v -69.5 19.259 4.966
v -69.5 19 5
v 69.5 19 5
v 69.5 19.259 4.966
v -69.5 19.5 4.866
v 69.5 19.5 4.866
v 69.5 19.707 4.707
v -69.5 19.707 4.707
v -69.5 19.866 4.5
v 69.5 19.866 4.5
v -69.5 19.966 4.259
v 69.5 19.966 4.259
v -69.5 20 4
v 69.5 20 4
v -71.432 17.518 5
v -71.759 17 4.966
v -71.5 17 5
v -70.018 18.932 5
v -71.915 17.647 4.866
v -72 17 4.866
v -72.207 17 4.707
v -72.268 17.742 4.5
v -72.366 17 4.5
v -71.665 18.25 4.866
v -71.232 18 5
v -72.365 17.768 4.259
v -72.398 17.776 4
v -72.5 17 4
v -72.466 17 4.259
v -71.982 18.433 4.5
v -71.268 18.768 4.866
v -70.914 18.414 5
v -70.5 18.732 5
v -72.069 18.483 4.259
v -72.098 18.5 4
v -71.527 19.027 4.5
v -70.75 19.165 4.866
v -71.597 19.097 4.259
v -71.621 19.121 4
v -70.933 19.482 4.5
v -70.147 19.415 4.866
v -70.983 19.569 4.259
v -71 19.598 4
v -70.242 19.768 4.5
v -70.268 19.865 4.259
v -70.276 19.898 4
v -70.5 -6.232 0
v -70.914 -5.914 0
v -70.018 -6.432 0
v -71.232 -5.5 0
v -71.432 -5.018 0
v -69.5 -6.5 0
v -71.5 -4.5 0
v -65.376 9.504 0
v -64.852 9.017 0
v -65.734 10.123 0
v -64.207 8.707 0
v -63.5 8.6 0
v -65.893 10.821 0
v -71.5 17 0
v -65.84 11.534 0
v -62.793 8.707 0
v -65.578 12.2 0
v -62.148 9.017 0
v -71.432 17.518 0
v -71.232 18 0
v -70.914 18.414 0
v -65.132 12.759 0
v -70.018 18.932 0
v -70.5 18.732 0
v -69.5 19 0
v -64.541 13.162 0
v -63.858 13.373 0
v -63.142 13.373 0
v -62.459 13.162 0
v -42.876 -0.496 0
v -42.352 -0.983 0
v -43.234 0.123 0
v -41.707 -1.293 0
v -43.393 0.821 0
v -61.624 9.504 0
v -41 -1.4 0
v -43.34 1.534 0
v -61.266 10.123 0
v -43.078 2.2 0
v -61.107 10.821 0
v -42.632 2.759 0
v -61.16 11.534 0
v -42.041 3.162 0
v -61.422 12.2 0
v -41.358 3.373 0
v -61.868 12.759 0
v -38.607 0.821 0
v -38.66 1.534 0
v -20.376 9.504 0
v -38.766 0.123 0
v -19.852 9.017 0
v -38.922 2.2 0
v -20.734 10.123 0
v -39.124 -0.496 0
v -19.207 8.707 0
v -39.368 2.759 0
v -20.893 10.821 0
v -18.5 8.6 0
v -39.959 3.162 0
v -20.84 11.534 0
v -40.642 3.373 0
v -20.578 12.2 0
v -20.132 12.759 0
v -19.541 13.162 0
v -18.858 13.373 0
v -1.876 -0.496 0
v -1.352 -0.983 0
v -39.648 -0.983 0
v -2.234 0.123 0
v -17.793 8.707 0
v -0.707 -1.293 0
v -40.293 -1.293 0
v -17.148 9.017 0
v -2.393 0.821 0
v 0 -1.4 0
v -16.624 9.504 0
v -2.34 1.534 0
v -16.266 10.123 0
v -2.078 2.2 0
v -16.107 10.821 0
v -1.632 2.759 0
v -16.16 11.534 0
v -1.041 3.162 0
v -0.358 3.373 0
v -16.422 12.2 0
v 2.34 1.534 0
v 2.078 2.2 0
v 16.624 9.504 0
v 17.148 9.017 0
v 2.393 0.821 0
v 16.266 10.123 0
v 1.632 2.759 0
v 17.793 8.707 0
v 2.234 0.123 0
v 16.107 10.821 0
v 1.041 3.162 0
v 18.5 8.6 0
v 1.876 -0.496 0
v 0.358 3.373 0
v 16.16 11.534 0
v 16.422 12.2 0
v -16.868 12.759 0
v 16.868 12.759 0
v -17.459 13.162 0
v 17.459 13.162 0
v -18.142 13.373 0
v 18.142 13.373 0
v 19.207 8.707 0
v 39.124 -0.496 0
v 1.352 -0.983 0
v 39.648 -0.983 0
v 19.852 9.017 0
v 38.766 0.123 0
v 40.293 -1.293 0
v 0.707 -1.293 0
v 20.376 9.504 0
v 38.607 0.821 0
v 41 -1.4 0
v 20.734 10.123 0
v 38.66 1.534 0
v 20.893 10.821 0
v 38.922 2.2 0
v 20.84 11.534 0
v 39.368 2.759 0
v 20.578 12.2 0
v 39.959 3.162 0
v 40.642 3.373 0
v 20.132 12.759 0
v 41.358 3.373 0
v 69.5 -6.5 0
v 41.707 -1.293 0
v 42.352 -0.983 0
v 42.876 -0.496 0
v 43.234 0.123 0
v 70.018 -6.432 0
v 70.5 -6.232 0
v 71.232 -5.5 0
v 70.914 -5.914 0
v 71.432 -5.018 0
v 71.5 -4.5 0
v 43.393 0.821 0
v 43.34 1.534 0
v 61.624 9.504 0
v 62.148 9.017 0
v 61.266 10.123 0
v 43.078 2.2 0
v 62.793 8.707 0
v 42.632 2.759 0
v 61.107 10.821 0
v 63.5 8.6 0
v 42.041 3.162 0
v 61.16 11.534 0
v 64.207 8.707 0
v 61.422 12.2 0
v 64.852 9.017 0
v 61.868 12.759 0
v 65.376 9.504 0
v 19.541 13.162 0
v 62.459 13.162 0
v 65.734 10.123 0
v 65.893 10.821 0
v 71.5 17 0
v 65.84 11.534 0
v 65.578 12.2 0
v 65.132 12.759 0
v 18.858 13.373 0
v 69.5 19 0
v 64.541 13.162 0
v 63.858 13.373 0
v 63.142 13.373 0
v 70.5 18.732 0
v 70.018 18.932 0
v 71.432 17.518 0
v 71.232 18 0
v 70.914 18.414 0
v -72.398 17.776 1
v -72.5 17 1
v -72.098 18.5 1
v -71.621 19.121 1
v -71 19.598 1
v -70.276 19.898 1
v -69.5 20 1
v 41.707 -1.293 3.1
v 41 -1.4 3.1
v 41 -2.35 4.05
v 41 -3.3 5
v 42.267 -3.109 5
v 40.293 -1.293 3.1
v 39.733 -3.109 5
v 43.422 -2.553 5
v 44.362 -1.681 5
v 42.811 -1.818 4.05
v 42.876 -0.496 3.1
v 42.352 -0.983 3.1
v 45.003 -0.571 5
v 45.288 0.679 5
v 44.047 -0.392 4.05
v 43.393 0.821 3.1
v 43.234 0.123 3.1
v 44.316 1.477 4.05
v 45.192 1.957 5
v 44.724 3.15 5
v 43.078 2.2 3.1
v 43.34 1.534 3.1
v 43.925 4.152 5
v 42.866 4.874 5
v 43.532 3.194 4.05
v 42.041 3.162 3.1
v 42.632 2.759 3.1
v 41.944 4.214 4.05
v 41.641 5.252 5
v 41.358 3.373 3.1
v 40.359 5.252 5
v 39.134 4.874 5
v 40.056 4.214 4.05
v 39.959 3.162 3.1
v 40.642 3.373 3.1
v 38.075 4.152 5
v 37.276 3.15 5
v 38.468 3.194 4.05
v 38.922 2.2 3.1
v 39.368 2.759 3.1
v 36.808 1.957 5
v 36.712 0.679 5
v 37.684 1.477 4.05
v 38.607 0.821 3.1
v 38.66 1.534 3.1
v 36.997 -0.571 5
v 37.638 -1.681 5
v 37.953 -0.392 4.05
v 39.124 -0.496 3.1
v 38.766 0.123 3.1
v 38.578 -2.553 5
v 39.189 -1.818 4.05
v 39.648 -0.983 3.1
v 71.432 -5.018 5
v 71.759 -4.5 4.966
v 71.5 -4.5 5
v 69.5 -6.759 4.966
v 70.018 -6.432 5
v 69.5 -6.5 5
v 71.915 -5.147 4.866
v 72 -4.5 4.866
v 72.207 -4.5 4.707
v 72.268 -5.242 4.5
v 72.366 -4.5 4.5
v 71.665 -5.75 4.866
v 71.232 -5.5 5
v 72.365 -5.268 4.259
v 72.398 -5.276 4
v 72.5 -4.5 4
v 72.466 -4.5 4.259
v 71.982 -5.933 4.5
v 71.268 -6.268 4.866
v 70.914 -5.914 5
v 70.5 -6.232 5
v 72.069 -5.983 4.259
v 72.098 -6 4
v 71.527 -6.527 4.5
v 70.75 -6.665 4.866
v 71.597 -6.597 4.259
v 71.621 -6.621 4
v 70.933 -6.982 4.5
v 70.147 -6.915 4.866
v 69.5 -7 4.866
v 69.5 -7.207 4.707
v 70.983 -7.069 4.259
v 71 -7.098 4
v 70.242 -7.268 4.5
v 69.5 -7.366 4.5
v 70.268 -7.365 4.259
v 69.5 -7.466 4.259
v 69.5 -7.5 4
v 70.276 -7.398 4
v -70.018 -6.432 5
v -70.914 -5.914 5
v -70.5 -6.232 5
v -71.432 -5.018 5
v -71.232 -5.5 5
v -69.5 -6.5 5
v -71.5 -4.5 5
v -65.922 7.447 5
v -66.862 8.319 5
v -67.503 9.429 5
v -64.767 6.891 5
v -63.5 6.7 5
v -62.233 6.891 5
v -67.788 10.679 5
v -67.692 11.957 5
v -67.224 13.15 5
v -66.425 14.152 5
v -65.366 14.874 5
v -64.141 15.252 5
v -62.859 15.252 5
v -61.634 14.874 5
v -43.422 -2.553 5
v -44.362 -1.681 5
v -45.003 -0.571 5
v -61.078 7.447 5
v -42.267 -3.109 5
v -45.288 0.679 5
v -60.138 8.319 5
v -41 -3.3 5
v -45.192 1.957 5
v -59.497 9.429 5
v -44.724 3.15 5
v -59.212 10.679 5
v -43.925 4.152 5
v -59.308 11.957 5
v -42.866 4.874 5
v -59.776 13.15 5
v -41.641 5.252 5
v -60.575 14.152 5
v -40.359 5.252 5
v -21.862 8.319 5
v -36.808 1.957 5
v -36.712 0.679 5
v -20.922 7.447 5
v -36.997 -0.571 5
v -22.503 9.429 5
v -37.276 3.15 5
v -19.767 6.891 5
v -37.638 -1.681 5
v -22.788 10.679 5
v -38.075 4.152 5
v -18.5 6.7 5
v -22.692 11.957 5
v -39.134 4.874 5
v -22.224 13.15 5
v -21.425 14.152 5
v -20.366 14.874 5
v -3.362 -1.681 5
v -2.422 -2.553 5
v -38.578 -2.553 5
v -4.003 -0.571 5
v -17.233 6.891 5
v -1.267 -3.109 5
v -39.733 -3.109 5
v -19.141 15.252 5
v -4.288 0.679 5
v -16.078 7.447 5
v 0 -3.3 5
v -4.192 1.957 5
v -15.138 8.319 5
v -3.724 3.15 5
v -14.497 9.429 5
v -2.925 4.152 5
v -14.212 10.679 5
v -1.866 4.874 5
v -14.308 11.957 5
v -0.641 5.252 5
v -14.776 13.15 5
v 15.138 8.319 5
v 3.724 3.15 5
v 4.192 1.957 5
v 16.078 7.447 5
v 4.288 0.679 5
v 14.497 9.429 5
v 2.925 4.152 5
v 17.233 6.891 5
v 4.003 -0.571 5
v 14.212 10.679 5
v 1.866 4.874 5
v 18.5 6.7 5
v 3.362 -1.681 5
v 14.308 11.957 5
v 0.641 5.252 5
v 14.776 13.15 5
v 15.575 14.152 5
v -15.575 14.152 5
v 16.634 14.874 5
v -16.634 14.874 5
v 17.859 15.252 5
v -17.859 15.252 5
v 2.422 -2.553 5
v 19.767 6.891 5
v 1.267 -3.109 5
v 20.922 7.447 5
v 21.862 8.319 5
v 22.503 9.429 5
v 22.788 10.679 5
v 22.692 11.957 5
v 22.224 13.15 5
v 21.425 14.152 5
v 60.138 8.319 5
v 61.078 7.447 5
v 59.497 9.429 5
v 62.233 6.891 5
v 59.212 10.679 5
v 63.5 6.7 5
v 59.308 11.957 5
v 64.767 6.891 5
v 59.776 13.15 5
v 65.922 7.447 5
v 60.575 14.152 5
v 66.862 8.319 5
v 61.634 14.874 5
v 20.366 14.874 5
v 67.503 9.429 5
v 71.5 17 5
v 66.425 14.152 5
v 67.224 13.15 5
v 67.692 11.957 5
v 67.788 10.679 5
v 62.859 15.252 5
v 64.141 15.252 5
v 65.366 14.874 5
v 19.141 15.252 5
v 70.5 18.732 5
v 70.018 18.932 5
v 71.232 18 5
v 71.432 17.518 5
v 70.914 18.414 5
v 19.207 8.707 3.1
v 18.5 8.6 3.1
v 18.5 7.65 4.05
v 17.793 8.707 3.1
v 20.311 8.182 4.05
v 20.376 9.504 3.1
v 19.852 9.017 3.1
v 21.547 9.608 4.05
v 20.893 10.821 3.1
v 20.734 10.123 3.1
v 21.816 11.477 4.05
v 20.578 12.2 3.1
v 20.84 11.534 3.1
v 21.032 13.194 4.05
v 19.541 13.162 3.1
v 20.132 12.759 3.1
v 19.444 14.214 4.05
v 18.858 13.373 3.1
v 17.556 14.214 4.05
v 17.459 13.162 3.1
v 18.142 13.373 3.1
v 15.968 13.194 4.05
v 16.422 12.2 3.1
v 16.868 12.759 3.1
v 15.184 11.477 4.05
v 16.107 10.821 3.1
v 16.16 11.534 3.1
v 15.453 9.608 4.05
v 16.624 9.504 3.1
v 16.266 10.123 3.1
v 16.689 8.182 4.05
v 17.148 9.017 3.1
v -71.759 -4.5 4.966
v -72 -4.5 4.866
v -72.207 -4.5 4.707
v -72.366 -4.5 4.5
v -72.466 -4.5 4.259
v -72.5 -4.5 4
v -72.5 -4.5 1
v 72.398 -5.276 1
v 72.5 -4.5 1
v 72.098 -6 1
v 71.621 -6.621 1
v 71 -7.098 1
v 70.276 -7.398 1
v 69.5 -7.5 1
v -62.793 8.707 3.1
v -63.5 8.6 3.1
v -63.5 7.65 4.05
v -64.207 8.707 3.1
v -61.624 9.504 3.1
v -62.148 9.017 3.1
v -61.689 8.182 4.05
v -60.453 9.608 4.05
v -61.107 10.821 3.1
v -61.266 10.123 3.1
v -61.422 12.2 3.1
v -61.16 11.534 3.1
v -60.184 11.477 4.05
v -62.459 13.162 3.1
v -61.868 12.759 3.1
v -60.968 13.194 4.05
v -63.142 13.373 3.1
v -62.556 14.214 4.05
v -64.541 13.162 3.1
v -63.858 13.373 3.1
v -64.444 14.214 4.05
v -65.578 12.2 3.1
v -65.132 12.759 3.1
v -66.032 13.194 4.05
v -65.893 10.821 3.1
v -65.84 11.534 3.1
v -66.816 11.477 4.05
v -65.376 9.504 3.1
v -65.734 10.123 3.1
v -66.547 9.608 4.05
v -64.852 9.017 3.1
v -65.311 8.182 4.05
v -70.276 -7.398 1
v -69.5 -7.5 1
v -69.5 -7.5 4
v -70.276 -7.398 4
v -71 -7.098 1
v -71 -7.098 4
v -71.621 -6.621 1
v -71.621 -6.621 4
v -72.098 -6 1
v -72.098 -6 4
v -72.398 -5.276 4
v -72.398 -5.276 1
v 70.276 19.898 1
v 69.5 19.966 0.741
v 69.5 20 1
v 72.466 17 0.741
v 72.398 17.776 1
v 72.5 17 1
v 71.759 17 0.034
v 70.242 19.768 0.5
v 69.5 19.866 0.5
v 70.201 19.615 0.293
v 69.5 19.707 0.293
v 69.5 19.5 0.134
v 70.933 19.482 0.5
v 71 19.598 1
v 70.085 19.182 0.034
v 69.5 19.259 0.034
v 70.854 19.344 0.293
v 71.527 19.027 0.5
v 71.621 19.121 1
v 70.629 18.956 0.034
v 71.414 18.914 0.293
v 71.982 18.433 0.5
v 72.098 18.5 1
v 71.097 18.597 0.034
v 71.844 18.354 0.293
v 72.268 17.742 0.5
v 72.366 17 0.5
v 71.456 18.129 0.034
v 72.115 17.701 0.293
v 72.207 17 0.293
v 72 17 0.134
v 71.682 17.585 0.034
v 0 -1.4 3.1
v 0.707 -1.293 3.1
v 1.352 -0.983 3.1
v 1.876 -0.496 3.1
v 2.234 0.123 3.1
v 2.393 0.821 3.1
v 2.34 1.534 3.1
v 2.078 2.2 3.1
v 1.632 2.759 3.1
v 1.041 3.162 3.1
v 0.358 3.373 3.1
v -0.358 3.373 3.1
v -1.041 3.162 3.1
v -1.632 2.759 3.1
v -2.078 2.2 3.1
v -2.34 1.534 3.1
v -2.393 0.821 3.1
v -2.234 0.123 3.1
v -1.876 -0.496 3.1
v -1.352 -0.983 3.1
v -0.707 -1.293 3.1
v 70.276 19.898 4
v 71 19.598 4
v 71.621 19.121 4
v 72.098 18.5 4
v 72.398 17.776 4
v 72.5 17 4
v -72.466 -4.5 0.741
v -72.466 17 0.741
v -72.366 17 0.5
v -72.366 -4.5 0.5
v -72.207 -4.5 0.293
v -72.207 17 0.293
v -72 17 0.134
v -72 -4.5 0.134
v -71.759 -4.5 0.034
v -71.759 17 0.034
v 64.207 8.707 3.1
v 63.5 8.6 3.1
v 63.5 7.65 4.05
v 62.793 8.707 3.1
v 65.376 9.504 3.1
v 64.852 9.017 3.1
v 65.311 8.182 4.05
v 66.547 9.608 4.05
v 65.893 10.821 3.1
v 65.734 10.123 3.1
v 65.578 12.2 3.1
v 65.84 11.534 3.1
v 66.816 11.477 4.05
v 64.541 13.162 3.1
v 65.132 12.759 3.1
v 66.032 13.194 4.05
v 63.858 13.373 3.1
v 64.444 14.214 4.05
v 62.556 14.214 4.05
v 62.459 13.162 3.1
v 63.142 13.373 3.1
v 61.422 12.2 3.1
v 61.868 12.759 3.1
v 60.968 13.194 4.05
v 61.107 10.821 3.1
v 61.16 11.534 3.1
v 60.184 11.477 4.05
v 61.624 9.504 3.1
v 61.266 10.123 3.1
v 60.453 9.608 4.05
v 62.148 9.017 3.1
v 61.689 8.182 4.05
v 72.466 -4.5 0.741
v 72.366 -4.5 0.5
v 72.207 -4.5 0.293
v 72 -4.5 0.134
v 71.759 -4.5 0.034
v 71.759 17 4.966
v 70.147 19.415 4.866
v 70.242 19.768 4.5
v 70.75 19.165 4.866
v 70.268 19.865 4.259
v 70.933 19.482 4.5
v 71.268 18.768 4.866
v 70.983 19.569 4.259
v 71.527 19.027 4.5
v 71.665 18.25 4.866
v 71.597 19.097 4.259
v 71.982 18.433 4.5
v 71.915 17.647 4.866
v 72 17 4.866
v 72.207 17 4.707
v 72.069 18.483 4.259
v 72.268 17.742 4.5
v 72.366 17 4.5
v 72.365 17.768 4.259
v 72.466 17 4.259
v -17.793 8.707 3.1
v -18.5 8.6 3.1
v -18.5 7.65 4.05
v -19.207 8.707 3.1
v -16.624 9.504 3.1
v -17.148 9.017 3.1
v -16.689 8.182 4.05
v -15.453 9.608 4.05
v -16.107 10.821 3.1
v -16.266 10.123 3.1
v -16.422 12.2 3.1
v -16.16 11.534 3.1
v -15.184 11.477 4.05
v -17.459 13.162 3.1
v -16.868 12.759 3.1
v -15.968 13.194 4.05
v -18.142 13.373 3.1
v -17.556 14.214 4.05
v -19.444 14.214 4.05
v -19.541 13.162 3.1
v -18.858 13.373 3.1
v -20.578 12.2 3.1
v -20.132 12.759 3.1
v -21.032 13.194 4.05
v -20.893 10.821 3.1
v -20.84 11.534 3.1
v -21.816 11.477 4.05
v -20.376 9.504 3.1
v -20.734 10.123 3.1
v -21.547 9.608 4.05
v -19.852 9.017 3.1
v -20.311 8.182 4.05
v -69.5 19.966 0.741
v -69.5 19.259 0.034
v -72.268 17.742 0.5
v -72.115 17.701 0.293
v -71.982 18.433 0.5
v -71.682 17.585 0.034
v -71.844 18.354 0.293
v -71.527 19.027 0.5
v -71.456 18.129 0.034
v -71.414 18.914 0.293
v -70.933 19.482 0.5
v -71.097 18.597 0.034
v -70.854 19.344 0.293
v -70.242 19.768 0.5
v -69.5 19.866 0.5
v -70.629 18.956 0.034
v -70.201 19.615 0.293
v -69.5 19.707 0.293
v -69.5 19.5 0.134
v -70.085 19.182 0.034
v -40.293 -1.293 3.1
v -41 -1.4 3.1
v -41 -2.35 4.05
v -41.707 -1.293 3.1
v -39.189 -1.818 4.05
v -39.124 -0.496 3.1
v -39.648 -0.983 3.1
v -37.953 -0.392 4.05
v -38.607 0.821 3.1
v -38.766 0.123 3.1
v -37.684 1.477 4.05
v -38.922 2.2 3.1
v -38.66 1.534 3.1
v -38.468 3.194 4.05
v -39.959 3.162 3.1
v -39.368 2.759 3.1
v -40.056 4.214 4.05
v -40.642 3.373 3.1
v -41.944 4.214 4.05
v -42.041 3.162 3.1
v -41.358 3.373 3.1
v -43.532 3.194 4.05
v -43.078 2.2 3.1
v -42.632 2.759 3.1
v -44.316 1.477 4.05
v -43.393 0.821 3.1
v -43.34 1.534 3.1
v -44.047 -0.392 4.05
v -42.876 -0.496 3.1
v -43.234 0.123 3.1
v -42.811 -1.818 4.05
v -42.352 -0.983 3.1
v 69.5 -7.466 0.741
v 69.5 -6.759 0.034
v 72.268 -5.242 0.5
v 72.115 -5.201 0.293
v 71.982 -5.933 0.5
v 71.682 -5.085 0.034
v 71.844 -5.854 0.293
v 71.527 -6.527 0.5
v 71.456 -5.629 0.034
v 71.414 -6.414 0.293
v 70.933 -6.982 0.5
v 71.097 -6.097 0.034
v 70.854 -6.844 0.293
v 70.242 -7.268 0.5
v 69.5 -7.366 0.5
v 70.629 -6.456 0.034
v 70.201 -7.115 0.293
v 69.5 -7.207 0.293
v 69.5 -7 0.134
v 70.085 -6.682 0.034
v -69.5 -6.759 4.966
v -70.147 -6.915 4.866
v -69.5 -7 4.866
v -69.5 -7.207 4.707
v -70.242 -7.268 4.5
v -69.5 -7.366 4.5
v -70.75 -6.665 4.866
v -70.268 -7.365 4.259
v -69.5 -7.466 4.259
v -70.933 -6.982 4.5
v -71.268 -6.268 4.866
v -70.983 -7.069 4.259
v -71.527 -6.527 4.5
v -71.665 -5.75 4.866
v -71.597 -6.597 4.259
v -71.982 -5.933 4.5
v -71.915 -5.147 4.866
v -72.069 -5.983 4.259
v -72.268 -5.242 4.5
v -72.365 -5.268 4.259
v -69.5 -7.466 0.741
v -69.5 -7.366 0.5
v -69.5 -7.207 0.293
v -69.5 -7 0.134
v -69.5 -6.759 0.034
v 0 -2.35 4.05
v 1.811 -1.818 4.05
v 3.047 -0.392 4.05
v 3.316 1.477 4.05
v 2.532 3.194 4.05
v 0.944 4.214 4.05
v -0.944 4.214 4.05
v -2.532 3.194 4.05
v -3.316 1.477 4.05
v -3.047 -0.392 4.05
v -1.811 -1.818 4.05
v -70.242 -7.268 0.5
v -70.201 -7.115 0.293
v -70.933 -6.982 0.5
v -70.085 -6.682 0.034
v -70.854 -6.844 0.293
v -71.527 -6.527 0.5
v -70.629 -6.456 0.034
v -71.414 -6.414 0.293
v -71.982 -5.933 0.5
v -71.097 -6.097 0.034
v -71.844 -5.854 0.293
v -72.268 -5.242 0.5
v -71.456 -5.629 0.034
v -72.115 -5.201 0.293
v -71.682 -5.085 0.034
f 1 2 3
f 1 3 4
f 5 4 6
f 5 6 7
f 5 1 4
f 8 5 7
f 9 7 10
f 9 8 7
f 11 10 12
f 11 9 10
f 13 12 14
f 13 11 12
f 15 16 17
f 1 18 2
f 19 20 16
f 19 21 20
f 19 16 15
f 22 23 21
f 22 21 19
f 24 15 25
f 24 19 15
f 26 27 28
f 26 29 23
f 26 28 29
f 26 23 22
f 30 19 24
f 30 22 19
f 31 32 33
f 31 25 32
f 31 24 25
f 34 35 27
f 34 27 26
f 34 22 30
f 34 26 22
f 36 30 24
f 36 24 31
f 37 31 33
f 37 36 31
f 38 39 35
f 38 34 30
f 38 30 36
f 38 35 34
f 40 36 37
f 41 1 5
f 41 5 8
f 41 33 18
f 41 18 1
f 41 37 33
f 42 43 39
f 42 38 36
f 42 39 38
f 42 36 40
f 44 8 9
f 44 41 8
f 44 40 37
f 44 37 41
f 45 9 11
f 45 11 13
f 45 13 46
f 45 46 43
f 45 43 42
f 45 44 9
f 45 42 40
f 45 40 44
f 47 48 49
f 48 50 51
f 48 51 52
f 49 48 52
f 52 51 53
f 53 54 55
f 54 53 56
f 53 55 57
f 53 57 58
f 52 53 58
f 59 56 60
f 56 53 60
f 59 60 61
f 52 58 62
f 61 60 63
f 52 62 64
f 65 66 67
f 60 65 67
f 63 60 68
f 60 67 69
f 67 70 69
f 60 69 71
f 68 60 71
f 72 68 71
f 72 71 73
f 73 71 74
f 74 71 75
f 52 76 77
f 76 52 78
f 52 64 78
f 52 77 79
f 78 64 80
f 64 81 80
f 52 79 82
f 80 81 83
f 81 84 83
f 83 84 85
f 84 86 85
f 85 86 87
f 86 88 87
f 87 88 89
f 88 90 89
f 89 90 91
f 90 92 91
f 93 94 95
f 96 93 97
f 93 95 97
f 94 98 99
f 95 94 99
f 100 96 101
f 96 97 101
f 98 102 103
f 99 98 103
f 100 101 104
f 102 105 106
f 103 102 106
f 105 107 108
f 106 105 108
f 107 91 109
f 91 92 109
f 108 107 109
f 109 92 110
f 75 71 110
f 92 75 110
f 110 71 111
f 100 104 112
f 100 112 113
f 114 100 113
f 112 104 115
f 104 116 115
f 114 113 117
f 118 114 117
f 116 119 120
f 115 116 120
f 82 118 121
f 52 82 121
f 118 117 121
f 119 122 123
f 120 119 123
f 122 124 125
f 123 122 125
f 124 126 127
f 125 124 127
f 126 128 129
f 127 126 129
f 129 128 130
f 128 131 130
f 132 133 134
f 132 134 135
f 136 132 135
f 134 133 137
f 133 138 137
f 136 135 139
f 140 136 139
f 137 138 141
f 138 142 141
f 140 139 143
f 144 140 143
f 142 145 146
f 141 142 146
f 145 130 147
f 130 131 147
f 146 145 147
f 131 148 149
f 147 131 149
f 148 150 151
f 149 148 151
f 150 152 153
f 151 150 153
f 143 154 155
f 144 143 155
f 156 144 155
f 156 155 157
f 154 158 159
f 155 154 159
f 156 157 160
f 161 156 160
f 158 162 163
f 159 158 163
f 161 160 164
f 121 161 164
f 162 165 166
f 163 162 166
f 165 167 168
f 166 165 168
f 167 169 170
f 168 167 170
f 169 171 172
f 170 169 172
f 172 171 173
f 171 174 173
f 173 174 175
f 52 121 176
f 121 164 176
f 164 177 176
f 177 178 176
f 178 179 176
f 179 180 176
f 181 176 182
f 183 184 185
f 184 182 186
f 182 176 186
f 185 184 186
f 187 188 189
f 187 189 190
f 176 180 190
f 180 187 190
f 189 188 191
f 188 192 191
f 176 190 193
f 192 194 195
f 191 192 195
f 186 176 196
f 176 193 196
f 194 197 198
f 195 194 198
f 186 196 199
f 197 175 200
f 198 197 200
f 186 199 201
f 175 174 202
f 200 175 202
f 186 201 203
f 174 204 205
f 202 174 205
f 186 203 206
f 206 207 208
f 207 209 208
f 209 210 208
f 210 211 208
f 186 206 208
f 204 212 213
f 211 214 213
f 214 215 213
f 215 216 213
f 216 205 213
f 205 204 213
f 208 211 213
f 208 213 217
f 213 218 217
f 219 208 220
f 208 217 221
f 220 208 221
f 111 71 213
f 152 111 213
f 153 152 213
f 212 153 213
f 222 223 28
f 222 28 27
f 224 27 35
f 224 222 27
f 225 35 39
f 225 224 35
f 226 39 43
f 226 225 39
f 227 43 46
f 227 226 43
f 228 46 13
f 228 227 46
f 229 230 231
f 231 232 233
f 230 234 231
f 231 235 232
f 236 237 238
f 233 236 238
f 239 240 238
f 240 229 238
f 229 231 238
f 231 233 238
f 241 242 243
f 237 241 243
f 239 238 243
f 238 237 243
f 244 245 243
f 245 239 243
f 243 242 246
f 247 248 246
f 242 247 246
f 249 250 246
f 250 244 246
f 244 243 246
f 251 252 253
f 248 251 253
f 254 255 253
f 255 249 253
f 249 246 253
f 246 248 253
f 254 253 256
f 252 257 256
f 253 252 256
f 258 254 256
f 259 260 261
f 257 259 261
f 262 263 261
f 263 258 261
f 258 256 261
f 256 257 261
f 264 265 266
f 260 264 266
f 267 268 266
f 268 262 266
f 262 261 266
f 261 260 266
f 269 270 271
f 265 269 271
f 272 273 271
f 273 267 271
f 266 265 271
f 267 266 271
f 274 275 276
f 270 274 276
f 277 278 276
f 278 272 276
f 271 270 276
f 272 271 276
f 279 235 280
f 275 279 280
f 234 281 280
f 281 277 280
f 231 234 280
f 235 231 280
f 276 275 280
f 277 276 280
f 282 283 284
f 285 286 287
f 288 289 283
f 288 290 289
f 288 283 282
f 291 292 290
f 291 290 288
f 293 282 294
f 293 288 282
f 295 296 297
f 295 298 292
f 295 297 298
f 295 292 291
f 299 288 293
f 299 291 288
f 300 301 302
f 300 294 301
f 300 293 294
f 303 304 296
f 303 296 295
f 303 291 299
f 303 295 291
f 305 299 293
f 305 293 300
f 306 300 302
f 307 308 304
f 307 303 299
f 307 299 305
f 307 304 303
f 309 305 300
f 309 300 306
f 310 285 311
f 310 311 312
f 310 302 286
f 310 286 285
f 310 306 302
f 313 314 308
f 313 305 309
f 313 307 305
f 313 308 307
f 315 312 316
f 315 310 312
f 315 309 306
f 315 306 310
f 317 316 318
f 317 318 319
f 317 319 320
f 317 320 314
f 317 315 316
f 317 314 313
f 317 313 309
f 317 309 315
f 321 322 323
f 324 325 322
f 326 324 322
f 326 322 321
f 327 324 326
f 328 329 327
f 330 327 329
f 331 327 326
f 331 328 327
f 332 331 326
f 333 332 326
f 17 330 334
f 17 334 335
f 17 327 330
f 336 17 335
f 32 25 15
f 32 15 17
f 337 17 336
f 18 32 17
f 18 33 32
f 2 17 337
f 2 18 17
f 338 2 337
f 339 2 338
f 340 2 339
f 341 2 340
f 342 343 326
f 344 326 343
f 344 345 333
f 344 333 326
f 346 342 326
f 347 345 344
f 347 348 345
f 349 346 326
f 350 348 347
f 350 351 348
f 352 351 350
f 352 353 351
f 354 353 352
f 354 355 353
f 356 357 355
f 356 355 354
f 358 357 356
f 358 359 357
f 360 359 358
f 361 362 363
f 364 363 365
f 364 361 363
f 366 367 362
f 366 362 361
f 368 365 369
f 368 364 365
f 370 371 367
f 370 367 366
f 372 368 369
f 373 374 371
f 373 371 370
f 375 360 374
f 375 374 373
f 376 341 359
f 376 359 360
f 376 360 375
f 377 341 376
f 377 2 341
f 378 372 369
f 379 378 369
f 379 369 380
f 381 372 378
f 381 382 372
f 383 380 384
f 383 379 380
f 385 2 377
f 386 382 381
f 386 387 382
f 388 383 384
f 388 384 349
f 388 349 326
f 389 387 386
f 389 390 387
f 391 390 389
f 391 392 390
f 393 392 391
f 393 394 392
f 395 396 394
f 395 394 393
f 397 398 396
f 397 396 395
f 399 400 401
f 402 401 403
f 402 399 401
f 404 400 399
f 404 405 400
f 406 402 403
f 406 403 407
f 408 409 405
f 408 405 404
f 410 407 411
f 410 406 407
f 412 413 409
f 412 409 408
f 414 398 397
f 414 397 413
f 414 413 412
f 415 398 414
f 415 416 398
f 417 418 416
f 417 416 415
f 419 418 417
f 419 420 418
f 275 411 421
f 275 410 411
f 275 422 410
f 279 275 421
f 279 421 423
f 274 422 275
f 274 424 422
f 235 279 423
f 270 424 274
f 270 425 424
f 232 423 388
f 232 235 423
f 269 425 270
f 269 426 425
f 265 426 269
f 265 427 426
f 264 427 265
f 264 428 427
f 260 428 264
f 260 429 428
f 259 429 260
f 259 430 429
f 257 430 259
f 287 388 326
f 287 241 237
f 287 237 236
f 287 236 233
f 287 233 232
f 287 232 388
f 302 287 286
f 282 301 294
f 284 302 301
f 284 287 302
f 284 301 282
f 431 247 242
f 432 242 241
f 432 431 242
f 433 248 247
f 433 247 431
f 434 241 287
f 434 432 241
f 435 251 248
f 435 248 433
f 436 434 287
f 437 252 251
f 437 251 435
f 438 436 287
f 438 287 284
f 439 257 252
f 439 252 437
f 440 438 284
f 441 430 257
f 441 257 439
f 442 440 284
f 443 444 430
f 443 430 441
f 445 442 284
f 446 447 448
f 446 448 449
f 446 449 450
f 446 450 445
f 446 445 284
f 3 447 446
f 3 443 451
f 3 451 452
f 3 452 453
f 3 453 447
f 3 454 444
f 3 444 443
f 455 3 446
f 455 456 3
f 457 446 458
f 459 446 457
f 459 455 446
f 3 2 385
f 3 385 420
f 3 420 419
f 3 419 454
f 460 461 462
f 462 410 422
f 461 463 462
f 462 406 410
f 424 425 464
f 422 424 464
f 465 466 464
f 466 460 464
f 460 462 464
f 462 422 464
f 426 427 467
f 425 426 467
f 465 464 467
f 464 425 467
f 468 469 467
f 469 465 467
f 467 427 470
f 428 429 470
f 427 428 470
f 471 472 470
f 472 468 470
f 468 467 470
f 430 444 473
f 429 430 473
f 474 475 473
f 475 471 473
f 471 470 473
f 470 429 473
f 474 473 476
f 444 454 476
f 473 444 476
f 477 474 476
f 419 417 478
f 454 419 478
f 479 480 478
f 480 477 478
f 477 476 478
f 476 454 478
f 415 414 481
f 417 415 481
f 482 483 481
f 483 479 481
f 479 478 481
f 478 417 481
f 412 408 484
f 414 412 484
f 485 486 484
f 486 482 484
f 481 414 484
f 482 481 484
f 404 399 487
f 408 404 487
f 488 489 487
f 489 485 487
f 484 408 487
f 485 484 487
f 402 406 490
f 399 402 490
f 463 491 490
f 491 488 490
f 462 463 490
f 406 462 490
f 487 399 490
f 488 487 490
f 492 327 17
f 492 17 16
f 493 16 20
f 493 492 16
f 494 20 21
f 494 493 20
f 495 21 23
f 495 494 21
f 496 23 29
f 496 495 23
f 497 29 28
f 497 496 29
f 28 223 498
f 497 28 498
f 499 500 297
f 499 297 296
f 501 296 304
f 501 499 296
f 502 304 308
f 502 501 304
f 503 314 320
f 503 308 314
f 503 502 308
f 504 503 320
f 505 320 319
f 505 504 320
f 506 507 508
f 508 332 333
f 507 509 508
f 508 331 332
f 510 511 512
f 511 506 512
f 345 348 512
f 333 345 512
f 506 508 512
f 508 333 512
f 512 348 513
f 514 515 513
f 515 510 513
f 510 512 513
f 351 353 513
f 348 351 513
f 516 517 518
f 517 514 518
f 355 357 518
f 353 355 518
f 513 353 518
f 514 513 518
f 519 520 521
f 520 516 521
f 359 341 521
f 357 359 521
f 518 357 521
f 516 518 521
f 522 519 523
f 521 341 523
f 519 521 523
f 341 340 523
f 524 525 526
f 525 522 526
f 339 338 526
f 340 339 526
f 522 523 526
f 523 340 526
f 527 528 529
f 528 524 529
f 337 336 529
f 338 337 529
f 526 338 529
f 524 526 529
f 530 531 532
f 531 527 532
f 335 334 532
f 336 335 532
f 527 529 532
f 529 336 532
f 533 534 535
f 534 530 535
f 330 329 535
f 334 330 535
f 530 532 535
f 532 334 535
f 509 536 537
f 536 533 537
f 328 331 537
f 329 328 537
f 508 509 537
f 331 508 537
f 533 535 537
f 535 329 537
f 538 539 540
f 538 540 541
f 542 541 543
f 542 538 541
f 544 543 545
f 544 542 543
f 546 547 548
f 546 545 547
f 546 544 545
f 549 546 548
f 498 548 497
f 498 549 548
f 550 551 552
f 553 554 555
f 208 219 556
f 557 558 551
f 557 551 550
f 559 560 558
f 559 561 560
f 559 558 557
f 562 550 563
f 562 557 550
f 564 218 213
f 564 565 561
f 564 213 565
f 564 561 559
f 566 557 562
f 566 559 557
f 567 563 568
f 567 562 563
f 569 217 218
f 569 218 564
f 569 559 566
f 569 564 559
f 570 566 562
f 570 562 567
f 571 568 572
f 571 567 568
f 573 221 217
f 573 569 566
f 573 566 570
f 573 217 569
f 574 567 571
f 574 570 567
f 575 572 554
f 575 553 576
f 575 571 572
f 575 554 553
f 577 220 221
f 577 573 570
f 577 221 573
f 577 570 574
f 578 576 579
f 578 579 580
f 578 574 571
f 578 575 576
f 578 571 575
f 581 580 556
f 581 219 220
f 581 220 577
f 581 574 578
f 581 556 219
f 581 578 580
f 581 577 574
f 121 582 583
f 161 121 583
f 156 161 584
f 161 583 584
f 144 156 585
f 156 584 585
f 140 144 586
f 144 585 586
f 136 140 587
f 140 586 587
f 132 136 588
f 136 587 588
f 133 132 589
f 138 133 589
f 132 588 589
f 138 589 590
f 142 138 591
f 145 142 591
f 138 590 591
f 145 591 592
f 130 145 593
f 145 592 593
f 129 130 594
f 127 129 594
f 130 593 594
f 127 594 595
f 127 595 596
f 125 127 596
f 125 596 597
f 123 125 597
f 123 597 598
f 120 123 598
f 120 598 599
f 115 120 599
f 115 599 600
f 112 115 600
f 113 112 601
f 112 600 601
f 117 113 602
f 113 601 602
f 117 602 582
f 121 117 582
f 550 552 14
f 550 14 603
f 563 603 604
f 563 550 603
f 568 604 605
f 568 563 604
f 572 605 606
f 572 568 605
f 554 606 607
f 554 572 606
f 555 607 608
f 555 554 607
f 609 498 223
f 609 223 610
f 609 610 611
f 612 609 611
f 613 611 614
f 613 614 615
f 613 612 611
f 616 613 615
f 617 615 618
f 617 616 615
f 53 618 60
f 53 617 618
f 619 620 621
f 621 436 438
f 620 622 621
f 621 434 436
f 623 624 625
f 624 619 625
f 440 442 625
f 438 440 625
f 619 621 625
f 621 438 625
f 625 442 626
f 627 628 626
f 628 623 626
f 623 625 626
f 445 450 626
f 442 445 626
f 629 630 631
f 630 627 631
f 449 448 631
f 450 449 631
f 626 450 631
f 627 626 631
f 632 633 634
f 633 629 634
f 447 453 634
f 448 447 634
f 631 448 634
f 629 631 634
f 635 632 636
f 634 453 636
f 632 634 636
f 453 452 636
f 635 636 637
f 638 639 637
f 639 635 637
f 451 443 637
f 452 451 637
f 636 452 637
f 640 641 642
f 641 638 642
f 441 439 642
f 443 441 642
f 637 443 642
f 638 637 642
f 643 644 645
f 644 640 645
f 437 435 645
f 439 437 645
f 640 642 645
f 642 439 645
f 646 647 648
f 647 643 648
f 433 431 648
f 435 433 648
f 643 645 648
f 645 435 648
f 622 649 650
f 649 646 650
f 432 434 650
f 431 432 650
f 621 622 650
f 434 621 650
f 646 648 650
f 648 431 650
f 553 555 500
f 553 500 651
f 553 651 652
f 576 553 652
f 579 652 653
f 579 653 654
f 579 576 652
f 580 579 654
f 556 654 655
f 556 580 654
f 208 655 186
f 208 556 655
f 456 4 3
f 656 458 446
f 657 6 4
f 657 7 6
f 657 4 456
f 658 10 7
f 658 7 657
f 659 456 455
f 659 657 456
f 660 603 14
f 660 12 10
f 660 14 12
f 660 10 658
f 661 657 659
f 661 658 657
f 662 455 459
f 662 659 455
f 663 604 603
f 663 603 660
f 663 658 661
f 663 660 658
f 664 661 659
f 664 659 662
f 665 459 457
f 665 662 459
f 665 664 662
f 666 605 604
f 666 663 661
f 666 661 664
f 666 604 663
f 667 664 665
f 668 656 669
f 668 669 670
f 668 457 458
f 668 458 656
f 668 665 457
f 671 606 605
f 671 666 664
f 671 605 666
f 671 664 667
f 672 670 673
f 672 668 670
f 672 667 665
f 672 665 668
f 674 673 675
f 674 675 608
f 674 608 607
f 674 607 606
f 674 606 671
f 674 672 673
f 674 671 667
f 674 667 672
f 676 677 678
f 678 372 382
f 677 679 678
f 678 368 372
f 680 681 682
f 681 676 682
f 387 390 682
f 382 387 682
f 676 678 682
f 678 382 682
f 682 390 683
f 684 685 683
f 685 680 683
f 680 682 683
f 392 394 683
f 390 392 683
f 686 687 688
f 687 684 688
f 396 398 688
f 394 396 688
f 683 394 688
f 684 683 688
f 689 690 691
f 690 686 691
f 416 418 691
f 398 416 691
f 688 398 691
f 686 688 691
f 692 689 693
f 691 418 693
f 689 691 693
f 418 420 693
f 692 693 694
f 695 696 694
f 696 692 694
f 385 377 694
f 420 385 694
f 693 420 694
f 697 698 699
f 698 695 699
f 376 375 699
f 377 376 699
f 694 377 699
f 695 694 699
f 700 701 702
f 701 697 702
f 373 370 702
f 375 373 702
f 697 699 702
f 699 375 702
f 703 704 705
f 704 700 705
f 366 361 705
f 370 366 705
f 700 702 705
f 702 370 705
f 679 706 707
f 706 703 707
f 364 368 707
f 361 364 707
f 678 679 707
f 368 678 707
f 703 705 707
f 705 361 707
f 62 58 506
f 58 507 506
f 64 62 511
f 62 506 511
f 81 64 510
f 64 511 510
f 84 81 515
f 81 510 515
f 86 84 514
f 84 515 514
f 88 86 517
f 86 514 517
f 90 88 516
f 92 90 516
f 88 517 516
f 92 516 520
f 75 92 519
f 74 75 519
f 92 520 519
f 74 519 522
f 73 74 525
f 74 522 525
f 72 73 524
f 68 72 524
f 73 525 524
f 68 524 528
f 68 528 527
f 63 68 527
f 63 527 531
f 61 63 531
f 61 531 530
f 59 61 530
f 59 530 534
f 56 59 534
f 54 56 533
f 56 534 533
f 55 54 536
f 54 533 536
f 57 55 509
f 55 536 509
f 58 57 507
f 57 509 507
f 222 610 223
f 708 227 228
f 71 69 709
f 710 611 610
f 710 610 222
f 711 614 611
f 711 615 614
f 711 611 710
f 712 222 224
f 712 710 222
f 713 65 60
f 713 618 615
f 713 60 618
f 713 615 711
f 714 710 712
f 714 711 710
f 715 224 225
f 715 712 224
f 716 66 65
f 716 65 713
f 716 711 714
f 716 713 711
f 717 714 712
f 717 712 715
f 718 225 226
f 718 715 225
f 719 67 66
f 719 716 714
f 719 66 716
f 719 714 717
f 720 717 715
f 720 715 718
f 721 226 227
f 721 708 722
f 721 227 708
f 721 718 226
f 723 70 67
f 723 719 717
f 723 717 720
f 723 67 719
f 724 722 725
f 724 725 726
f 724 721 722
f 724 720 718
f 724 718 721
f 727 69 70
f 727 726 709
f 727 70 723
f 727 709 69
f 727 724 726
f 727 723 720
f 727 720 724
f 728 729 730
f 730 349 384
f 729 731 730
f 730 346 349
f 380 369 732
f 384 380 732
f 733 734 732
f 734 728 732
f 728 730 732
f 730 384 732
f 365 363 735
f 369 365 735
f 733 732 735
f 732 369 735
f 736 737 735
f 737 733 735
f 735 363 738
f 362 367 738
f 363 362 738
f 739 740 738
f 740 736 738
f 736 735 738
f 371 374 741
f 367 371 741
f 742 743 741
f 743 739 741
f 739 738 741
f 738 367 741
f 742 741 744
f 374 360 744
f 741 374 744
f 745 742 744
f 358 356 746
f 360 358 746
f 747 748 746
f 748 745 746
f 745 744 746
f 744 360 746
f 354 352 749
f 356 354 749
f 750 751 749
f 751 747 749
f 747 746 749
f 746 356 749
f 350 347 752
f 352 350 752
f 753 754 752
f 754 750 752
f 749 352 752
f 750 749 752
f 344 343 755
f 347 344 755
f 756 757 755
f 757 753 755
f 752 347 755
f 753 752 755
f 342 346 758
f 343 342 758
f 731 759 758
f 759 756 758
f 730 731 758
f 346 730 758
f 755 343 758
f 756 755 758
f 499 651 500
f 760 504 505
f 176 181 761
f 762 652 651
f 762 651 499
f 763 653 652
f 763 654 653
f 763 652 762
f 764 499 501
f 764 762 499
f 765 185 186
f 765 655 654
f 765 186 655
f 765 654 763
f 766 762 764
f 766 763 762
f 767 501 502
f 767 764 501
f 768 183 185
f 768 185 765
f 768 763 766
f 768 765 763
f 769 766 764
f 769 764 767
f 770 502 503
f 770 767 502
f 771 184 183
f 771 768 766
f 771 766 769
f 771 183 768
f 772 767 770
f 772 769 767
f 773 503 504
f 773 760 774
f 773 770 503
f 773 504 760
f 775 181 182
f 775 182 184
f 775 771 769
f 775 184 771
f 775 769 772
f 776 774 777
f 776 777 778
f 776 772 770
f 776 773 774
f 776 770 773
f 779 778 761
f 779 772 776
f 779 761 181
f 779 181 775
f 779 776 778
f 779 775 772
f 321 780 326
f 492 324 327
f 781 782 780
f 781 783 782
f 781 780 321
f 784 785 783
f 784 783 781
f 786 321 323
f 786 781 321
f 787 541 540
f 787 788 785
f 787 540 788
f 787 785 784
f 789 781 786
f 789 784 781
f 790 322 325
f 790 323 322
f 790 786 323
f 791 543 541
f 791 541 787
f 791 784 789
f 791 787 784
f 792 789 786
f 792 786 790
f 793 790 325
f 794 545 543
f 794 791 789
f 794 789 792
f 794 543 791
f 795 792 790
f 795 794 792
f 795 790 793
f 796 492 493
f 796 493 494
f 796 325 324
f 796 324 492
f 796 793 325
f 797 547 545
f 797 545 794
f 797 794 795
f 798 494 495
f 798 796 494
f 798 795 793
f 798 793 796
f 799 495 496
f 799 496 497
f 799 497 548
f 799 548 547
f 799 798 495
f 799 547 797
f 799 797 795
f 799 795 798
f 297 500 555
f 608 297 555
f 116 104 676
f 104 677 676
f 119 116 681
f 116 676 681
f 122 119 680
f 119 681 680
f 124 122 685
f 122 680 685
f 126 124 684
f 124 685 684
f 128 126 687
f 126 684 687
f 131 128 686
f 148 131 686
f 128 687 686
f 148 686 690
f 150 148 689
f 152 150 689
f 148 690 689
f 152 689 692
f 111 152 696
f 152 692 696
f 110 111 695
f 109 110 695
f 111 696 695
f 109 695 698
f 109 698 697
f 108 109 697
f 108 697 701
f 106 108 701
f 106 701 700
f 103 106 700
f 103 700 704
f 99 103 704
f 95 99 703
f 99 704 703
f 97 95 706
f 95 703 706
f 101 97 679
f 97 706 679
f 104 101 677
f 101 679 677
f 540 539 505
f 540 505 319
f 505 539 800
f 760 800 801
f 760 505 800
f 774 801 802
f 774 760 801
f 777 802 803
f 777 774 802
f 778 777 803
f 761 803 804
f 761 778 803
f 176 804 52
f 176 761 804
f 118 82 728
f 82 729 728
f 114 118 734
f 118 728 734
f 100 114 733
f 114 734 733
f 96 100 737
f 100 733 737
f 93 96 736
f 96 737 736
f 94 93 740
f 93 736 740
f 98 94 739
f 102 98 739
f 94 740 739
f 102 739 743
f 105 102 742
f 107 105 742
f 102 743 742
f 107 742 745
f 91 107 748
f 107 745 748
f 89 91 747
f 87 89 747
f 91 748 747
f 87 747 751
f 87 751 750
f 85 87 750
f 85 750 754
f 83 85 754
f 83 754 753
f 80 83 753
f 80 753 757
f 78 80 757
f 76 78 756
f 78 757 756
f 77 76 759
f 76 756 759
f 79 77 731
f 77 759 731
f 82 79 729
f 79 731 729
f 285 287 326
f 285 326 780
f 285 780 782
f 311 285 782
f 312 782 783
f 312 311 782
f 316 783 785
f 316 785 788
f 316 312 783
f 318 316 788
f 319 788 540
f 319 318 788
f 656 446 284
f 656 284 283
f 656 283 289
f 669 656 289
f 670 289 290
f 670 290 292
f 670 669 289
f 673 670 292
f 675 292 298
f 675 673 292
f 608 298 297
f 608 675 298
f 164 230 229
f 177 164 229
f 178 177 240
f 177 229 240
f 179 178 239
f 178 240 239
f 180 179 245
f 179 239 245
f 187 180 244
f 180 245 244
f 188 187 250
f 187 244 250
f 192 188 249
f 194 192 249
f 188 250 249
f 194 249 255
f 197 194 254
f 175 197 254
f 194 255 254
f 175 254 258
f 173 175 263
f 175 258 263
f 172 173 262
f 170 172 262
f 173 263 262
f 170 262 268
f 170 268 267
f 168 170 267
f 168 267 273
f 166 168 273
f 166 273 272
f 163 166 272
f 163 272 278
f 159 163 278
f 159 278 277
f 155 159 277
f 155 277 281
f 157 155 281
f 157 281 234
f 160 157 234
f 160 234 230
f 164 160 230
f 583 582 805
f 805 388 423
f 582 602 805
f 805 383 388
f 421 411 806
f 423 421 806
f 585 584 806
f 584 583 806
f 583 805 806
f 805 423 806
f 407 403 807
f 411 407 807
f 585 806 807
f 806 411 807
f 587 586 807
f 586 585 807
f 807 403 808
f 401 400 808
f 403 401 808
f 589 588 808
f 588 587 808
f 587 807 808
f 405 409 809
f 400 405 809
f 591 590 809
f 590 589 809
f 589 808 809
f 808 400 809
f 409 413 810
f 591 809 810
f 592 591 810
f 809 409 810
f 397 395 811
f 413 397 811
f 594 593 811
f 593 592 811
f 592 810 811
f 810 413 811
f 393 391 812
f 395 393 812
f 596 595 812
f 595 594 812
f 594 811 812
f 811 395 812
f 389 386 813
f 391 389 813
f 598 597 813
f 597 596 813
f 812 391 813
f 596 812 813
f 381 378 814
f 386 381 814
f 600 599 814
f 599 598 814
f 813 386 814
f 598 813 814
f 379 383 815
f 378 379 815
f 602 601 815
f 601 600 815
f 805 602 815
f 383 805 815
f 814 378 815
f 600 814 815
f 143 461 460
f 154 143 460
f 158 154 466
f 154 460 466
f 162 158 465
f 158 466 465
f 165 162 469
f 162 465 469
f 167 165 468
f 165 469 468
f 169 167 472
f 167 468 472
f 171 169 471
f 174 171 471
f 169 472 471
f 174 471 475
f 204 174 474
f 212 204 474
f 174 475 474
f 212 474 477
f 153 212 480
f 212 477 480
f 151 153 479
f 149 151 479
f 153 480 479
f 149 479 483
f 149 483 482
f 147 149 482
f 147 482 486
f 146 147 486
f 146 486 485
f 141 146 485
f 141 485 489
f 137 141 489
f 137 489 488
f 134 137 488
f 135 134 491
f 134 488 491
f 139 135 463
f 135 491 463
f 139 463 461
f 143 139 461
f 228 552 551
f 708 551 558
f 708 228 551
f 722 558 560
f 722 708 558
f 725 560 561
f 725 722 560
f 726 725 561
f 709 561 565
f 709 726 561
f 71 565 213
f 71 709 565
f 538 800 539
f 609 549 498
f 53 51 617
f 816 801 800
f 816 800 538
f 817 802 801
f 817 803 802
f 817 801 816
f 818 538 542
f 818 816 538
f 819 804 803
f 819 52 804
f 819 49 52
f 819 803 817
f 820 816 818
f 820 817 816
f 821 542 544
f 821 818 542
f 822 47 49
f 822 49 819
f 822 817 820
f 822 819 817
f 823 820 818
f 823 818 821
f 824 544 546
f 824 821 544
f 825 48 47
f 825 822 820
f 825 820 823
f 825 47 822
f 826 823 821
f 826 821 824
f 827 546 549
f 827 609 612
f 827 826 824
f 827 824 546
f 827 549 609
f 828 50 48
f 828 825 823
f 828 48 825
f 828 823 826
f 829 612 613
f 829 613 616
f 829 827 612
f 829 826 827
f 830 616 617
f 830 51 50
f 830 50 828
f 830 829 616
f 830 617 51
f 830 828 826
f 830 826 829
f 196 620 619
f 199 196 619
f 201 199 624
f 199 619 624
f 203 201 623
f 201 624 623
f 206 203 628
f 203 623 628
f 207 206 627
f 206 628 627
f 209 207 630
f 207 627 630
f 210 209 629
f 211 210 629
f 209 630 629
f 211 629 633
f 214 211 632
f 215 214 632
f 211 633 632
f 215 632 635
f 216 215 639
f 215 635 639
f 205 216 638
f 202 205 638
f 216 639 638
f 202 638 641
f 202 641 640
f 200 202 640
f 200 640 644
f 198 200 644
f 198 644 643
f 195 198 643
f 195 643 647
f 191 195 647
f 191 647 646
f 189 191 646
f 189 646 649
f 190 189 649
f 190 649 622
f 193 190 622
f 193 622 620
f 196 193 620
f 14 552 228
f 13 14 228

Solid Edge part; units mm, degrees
sketch "Sketch1" plane through (0, 0, 0) normal (0, 0, 1) x (1, 0, 0)
  line L0 (-72.5, -20) -> (72.5, -20)
  line L1 (72.5, -20) -> (72.5, 20)
  line L2 (72.5, 20) -> (-72.5, 20)
  line L3 (-72.5, 20) -> (-72.5, -20)
extrude "Protrusion1" add sketch "Sketch1" along normal blind 5
hole "Bohrung_1" at (-63.5, 11, 5) direction (0, 0, -1) diameter 4.8 end up to next countersink diameter 8.6 countersink angle 90
hole "Hole1" at (-18.5, 11, 5) direction (0, 0, -1) diameter 4.8 end up to next countersink diameter 8.6 countersink angle 90
hole "Hole2" at (18.5, 11, 5) direction (0, 0, -1) diameter 4.8 end up to next countersink diameter 8.6 countersink angle 90
hole "Hole3" at (63.5, 11, 5) direction (0, 0, -1) diameter 4.8 end up to next countersink diameter 8.6 countersink angle 90
hole "Hole4" at (41, 1, 5) direction (0, 0, -1) diameter 4.8 end up to next countersink diameter 8.6 countersink angle 90
hole "Hole5" at (0, 1, 5) direction (0, 0, -1) diameter 4.8 end up to next countersink diameter 8.6 countersink angle 90
hole "Hole6" at (-41, 1, 5) direction (0, 0, -1) diameter 4.8 end up to next countersink diameter 8.6 countersink angle 90
sketch "Sketch2" plane through (-72.5, 0, 2.5) normal (-1, 0, 0) x (0, 1, 0)
  line L0 (-7.5, 2.5) -> (-7.5, -2.5)
  line L1 (-7.5, -2.5) -> (-21.6634, -3.36)
  line L2 (-21.6634, -3.36) -> (-22.4966, 5.1713)
  line L3 (-22.4966, 5.1713) -> (-7.5, 2.5)
  dimension "D1" = 12.5
extrude "Extrusionsausschnitt_1" cut sketch "Sketch2" against normal blind 163.0686
fillet "Verrundung_1" radius 1 4 edges at (-72.5, 6.25, 5) (0, 20, 5) (72.5, 6.25, 5) (0, -7.5, 5)
fillet "Verrundung_2" radius 3 8 edges at (-72.5, 20, 2) (-72.2071, 19.7071, 4.7071) (-72.2071, -7.2071, 4.7071) (-72.5, -7.5, 2) (72.5, 20, 2) (72.2071, 19.7071, 4.7071) (72.5, -7.5, 2) (72.2071, -7.2071, 4.7071)
fillet "Verrundung_3" radius 1 7 edges at (-72.5, 6.25, 0) (-71.6213, -6.6213, 0) (0, -7.5, 0) (71.6213, -6.6213, 0) (72.5, 6.25, 0) (0, 20, 0) (-71.6213, 19.1213, 0)
